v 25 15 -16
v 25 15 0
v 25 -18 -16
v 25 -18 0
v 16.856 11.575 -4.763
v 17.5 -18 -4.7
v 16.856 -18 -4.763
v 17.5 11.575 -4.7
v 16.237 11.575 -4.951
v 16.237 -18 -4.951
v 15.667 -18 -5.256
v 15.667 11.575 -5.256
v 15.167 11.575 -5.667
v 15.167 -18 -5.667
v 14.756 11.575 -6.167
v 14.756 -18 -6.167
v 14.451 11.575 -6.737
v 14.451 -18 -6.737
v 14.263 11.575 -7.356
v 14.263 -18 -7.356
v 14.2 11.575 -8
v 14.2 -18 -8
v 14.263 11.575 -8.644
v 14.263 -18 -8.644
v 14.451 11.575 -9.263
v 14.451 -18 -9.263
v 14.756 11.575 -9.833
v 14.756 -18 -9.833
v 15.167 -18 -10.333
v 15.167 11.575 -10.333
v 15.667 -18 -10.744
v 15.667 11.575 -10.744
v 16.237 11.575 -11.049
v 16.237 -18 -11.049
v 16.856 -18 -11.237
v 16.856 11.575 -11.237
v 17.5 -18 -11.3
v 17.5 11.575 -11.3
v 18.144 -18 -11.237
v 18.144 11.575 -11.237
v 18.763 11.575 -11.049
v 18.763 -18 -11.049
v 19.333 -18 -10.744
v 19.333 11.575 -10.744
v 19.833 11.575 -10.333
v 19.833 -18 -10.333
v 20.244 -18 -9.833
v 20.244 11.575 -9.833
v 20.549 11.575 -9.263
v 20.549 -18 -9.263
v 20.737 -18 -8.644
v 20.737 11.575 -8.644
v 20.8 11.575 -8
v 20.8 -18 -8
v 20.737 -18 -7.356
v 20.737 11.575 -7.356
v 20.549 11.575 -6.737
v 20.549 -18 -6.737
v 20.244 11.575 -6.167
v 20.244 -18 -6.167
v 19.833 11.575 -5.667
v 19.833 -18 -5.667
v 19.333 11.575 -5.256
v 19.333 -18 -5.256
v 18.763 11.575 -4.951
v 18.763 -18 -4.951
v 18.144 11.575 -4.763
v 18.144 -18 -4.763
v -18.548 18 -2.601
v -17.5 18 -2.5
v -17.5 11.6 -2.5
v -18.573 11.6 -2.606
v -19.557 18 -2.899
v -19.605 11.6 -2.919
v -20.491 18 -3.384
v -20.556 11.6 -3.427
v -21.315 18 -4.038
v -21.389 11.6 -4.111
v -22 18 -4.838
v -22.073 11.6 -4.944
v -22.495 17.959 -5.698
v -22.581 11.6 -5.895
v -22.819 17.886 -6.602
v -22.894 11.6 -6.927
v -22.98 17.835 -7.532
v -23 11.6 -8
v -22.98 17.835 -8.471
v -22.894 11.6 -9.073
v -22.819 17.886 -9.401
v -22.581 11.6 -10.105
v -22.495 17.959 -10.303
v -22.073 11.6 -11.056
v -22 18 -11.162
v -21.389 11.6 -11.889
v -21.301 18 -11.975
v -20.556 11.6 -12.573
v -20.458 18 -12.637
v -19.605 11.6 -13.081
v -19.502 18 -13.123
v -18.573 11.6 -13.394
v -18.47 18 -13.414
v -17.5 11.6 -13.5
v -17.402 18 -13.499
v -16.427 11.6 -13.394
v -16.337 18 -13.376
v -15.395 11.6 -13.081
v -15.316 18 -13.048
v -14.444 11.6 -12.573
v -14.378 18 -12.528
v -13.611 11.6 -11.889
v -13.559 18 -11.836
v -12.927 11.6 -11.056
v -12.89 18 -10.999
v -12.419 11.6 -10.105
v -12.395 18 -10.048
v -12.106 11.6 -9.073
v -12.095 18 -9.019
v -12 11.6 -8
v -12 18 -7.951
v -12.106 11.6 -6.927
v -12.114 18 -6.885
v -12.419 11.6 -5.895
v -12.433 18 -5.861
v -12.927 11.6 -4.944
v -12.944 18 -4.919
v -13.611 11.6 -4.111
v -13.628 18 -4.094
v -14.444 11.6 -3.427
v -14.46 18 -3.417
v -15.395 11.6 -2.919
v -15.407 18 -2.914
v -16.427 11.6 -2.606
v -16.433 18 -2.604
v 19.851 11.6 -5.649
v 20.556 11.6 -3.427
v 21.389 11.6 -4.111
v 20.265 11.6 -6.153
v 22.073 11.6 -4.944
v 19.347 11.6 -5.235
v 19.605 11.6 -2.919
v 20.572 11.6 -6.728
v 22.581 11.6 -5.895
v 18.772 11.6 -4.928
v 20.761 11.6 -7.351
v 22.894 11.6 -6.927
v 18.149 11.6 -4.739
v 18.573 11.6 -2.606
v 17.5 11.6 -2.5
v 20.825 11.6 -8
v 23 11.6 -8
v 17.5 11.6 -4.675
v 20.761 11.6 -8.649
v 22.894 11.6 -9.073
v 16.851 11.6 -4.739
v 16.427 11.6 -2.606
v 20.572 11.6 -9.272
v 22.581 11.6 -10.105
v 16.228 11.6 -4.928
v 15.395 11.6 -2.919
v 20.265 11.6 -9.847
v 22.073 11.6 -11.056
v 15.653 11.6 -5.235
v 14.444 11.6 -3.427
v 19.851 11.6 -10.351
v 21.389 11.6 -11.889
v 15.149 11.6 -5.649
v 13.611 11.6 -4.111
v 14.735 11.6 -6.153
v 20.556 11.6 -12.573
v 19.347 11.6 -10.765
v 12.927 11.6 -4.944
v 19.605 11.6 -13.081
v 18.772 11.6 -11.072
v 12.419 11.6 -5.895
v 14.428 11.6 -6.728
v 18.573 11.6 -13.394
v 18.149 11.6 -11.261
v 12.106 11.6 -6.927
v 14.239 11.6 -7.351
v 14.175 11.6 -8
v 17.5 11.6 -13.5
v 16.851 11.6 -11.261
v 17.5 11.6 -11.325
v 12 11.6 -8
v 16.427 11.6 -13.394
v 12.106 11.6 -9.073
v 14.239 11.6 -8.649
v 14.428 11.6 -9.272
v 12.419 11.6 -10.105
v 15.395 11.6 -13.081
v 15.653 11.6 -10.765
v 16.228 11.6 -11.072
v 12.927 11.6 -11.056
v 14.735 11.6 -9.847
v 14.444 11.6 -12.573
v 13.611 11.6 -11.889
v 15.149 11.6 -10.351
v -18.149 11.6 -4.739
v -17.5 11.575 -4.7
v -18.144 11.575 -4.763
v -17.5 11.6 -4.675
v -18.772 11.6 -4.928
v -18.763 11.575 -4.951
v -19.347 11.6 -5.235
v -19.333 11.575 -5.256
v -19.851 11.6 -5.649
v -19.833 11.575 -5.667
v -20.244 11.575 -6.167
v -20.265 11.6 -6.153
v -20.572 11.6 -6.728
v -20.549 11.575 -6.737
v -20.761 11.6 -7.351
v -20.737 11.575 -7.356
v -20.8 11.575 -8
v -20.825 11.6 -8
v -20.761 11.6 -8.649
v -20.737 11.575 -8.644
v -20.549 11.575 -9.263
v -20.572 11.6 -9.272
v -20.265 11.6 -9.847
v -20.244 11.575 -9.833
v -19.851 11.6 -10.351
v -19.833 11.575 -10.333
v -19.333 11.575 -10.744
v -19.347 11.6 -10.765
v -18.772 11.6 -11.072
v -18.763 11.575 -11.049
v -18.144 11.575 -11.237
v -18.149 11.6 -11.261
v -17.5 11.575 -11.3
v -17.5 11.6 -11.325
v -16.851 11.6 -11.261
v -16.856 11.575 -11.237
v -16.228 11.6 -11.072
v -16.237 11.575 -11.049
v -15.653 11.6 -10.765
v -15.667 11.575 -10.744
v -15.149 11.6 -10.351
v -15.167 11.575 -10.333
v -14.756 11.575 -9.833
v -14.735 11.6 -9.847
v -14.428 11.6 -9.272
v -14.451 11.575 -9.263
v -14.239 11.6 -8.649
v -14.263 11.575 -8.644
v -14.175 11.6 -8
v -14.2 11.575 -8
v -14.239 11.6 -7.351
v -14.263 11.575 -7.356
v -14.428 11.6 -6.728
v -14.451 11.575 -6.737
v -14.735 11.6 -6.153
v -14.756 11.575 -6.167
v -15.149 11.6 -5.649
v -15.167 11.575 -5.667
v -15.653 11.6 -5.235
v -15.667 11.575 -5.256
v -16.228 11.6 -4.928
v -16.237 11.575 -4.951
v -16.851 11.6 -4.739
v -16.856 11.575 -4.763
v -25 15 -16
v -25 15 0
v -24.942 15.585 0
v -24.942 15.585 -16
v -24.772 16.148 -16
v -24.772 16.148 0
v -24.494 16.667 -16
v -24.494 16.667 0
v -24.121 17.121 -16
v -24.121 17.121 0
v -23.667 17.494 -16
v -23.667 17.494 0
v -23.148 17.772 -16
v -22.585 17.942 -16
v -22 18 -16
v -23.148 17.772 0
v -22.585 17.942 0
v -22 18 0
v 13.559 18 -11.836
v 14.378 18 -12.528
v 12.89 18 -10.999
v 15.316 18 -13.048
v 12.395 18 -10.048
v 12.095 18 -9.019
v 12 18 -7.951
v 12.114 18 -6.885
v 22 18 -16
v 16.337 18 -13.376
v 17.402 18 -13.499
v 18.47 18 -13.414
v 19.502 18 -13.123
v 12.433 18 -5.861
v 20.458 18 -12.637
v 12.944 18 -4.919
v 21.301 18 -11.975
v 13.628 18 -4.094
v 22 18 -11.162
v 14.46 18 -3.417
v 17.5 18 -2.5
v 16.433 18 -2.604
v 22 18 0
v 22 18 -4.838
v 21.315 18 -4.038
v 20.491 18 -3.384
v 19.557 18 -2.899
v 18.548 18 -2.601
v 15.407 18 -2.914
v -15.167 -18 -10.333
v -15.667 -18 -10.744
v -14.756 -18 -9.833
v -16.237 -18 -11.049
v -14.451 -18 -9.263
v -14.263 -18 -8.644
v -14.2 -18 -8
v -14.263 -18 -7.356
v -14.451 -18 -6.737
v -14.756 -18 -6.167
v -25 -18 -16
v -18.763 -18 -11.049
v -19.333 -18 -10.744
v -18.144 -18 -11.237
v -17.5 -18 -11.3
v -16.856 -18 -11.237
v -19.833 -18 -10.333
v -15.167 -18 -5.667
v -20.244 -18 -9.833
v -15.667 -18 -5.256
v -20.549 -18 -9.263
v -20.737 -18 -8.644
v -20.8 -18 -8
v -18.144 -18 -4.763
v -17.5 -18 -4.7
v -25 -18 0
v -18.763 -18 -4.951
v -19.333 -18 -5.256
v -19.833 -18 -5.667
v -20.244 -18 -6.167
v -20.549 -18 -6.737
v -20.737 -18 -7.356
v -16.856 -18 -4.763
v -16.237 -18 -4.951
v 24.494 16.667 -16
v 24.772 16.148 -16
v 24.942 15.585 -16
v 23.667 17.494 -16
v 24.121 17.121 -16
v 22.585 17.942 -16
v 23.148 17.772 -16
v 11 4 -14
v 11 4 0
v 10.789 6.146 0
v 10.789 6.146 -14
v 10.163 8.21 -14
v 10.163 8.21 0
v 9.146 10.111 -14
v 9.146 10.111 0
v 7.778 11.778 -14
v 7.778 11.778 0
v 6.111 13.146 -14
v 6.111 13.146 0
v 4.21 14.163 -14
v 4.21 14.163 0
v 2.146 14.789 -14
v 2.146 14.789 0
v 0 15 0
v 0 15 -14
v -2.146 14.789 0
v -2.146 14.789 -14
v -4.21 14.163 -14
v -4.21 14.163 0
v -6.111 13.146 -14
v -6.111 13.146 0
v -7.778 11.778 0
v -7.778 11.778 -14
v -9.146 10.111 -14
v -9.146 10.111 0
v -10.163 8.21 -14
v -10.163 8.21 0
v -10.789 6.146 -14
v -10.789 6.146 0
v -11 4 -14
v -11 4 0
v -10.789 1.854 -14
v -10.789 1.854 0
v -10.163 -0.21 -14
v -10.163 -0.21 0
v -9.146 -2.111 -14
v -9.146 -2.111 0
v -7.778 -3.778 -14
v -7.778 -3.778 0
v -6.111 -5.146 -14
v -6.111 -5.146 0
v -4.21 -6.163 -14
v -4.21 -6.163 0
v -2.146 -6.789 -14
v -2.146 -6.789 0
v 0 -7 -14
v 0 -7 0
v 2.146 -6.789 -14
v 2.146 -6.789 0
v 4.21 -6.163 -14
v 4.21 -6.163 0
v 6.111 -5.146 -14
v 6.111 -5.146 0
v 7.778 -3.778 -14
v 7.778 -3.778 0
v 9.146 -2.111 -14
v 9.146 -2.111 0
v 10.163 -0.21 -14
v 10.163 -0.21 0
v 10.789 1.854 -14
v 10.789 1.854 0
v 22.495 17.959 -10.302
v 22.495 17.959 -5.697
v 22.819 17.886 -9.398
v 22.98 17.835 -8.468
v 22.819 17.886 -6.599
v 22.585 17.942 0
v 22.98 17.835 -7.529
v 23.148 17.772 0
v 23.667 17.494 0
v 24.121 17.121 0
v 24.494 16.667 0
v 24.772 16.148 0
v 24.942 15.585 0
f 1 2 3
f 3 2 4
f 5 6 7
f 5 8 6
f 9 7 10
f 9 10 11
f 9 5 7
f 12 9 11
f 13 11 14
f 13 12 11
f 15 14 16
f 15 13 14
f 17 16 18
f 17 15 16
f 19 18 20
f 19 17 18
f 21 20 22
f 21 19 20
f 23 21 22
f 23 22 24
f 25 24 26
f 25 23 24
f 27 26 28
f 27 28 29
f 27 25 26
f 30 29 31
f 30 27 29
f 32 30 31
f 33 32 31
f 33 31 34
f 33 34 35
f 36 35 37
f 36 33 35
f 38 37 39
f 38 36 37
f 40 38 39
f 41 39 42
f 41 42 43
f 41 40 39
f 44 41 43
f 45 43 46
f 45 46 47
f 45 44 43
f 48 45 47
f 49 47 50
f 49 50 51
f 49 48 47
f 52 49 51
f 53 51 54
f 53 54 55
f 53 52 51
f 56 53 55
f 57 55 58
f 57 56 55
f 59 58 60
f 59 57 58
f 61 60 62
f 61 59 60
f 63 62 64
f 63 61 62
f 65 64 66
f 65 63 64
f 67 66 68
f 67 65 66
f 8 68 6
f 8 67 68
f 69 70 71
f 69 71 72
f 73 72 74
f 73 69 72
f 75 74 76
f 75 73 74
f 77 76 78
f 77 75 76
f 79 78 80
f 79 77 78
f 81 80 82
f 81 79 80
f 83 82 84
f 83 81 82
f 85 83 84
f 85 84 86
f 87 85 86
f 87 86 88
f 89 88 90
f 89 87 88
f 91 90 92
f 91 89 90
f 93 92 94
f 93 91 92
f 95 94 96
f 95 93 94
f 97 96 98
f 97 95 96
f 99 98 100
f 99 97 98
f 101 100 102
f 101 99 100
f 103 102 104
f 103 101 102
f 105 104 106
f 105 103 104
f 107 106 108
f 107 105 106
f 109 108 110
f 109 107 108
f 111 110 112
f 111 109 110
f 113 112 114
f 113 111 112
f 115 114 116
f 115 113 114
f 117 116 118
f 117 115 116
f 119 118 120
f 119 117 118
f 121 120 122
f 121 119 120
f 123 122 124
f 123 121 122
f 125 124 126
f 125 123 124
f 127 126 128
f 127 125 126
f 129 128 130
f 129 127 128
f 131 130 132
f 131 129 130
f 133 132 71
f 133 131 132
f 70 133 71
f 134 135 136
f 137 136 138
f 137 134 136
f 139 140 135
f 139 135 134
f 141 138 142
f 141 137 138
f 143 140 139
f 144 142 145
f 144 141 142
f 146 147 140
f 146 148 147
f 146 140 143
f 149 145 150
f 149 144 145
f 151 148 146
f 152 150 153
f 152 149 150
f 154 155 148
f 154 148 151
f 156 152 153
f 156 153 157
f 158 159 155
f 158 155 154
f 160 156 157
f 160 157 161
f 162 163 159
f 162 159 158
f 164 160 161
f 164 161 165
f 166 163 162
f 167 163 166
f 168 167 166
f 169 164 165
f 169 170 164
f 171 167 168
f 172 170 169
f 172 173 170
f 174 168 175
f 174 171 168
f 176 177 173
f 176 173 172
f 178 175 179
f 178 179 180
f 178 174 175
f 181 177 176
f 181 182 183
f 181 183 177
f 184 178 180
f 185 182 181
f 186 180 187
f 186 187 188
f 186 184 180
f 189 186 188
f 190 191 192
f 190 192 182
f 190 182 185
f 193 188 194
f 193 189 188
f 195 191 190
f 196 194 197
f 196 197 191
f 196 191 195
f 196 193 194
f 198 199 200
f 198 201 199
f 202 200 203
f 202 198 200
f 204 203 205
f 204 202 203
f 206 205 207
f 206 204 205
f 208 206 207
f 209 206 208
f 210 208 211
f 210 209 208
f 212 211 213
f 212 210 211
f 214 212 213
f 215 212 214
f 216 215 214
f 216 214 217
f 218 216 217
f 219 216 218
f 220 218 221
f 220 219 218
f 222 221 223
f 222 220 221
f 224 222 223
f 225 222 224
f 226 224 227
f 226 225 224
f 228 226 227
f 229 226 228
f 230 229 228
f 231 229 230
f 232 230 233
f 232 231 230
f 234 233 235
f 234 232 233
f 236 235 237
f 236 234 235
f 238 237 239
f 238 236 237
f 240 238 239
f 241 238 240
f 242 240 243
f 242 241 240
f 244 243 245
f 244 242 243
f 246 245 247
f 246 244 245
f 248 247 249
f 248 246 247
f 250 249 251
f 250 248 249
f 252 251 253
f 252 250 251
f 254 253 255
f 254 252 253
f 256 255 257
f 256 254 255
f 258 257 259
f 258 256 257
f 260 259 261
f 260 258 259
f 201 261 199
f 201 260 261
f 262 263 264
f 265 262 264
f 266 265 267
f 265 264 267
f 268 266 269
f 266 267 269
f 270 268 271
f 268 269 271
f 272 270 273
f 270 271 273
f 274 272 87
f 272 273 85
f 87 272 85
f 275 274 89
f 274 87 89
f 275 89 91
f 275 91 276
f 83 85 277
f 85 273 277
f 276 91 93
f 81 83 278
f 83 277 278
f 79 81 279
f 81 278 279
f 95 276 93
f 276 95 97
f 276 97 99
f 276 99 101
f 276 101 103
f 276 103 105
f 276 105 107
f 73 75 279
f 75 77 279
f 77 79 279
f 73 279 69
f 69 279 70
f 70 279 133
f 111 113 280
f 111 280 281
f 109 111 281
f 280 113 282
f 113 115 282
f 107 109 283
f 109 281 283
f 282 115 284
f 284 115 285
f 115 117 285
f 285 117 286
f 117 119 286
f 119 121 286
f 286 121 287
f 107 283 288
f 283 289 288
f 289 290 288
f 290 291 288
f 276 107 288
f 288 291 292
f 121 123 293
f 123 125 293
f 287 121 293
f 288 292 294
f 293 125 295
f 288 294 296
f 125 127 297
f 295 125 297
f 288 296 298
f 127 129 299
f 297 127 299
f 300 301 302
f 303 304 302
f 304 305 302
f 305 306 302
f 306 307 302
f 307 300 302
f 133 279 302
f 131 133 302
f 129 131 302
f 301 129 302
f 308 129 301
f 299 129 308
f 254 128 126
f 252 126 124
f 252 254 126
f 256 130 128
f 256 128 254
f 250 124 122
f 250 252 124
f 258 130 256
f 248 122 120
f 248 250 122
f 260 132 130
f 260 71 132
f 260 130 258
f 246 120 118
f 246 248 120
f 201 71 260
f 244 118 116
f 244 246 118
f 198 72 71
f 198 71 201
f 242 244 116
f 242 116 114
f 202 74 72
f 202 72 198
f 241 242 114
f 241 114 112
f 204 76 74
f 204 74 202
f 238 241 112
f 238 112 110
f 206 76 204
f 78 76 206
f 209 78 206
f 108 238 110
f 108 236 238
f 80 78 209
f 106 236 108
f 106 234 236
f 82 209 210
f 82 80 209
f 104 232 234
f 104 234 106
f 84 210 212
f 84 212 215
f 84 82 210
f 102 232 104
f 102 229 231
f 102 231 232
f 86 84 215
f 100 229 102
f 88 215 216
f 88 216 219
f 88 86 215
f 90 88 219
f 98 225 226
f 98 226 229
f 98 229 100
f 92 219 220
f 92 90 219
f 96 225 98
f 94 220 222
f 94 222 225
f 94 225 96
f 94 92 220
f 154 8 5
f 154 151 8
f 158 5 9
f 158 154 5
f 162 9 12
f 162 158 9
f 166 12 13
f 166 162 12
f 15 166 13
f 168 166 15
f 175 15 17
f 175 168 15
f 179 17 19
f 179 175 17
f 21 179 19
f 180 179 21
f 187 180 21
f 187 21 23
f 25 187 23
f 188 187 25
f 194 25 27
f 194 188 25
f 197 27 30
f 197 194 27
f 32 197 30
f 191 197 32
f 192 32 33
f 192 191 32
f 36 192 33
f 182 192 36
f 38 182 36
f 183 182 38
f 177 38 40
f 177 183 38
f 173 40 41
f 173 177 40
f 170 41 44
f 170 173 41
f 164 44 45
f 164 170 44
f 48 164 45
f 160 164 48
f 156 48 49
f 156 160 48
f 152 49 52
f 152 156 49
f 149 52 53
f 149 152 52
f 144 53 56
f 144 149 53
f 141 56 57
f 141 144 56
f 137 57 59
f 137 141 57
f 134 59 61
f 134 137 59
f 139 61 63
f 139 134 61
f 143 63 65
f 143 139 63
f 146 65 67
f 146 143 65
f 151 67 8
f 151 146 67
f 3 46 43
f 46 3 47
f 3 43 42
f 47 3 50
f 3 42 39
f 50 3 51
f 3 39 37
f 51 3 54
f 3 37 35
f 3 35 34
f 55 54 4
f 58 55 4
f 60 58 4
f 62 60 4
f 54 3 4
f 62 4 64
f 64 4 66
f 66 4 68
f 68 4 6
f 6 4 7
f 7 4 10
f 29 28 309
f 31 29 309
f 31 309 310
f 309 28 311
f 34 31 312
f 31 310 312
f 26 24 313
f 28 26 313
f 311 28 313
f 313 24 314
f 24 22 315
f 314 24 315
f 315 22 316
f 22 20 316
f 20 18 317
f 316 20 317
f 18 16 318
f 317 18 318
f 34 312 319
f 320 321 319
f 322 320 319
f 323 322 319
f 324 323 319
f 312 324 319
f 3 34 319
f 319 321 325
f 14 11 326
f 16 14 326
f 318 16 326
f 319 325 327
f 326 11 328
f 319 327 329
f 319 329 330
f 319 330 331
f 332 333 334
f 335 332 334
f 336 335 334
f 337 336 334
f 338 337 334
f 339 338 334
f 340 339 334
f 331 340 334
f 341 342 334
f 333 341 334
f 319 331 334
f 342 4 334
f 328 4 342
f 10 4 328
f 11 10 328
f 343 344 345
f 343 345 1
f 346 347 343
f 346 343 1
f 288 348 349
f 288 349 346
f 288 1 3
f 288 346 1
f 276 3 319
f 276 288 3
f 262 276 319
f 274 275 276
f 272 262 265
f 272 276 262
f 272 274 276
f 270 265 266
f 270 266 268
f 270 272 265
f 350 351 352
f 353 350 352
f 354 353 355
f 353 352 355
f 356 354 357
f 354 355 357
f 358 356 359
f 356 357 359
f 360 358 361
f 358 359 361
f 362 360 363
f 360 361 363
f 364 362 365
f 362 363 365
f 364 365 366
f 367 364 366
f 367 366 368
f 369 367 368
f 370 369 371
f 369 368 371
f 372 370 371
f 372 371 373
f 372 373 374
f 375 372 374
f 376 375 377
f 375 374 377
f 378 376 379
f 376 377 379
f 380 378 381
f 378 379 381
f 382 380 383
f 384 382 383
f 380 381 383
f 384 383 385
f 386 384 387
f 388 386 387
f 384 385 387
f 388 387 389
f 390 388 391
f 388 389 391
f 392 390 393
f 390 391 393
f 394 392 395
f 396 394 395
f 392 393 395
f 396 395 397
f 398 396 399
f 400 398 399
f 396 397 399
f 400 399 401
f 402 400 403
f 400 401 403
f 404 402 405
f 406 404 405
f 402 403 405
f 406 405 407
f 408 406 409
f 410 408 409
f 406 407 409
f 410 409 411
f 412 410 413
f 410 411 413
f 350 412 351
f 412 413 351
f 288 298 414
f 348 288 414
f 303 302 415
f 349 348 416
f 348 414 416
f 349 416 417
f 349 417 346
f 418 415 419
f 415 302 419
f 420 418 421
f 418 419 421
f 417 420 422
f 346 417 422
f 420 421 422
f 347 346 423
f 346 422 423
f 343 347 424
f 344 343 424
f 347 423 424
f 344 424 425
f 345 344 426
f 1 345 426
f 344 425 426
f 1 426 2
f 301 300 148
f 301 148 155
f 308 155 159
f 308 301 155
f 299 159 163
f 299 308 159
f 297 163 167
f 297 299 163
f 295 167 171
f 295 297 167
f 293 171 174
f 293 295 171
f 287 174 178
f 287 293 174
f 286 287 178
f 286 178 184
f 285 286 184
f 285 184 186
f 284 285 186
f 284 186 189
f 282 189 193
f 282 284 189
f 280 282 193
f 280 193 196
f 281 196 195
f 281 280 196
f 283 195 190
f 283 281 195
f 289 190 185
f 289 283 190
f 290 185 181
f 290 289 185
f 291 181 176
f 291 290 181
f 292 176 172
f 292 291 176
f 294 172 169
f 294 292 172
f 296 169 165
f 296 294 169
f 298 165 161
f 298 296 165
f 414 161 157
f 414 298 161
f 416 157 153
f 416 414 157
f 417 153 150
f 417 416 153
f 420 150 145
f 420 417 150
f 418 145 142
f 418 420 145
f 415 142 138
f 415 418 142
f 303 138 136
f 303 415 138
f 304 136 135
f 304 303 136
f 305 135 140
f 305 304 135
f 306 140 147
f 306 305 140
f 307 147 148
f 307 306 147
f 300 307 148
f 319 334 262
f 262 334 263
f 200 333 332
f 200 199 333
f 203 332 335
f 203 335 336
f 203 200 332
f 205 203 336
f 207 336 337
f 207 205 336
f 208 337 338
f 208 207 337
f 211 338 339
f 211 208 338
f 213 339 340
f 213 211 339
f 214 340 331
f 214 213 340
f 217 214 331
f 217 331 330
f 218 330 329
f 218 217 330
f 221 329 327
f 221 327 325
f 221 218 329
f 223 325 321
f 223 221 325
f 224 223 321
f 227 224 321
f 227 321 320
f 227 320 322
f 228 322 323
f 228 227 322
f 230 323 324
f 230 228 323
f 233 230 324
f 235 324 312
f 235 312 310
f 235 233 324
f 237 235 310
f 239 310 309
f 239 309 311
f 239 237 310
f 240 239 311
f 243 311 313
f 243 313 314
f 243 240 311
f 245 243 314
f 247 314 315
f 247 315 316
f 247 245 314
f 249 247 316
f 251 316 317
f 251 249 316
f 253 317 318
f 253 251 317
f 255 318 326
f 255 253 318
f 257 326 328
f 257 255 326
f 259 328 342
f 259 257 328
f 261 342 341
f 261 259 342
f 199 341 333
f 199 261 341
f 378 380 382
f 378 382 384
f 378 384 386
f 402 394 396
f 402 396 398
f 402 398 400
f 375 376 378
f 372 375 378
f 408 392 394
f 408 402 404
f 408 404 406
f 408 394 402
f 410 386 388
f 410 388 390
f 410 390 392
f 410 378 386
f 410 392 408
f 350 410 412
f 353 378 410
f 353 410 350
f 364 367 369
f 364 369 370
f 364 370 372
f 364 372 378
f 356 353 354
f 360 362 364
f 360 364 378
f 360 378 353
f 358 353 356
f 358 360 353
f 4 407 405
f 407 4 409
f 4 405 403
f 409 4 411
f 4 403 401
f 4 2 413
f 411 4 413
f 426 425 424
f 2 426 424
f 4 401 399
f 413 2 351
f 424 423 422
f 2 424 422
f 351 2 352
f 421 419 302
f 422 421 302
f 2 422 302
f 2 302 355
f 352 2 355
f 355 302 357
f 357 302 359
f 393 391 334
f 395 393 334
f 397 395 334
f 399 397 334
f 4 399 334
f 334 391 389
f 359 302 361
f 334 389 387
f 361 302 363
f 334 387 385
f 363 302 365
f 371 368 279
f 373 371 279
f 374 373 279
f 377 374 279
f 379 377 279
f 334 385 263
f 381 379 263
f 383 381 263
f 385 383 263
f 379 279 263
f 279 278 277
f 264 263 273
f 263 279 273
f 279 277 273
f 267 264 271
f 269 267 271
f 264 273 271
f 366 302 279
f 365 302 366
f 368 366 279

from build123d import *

# Parameters (mm, degrees)
EXTRUDE_349_DEPTH        = 16
HOLE_WIZARD_6_AT_2_COUNT = 2
HOLE_WIZARD_6_AT_2_PITCH = 35
SKETCH_14_R              = 11
CUT_EXTRUDE_608_DEPTH    = 14


with BuildPart() as part:
    # Эскиз8 → Extrude 349 (new body)
    with BuildSketch(Plane.XY):
        with BuildLine():
            Line((-22, 18), (22, 18))
            ThreePointArc((22, 18), (24.121320344, 17.121320344), (25, 15))
            Line((25, 15), (25, -18))
            Line((25, -18), (-25, -18))
            Line((-25, -18), (-25, 15))
            ThreePointArc((-25, 15), (-24.121320344, 17.121320344), (-22, 18))
        make_face()
    extrude(amount=-EXTRUDE_349_DEPTH)

    # Эскиз11 → Крепление-М6 (revolve, cut)
    with BuildSketch(Plane(origin=(-17.5, 18, -8), x_dir=(0, 0, 1), z_dir=(1, 0, 0))):
        Polygon((0, 0), (0, 36), (3.3, 36), (3.3, 6.425), (3.325, 6.4), (5.5, 6.4), (5.5, 0), align=None)
    hole_wizard_6 = revolve(axis=Axis((-17.5, 24.35, -8), (0, -1, 0)), mode=Mode.SUBTRACT)

    # Крепление-М6 at 2: Крепление-М6 ×2
    with Locations(*[(i * HOLE_WIZARD_6_AT_2_PITCH, 0, 0) for i in range(1, HOLE_WIZARD_6_AT_2_COUNT)]):
        add(hole_wizard_6, mode=Mode.SUBTRACT)

    # Эскиз14 → Вырез-608 (cut)
    with BuildSketch(Plane.XY):
        with Locations((0, 4)):
            Circle(SKETCH_14_R)
    extrude(amount=-CUT_EXTRUDE_608_DEPTH, mode=Mode.SUBTRACT)


solid = part.part
